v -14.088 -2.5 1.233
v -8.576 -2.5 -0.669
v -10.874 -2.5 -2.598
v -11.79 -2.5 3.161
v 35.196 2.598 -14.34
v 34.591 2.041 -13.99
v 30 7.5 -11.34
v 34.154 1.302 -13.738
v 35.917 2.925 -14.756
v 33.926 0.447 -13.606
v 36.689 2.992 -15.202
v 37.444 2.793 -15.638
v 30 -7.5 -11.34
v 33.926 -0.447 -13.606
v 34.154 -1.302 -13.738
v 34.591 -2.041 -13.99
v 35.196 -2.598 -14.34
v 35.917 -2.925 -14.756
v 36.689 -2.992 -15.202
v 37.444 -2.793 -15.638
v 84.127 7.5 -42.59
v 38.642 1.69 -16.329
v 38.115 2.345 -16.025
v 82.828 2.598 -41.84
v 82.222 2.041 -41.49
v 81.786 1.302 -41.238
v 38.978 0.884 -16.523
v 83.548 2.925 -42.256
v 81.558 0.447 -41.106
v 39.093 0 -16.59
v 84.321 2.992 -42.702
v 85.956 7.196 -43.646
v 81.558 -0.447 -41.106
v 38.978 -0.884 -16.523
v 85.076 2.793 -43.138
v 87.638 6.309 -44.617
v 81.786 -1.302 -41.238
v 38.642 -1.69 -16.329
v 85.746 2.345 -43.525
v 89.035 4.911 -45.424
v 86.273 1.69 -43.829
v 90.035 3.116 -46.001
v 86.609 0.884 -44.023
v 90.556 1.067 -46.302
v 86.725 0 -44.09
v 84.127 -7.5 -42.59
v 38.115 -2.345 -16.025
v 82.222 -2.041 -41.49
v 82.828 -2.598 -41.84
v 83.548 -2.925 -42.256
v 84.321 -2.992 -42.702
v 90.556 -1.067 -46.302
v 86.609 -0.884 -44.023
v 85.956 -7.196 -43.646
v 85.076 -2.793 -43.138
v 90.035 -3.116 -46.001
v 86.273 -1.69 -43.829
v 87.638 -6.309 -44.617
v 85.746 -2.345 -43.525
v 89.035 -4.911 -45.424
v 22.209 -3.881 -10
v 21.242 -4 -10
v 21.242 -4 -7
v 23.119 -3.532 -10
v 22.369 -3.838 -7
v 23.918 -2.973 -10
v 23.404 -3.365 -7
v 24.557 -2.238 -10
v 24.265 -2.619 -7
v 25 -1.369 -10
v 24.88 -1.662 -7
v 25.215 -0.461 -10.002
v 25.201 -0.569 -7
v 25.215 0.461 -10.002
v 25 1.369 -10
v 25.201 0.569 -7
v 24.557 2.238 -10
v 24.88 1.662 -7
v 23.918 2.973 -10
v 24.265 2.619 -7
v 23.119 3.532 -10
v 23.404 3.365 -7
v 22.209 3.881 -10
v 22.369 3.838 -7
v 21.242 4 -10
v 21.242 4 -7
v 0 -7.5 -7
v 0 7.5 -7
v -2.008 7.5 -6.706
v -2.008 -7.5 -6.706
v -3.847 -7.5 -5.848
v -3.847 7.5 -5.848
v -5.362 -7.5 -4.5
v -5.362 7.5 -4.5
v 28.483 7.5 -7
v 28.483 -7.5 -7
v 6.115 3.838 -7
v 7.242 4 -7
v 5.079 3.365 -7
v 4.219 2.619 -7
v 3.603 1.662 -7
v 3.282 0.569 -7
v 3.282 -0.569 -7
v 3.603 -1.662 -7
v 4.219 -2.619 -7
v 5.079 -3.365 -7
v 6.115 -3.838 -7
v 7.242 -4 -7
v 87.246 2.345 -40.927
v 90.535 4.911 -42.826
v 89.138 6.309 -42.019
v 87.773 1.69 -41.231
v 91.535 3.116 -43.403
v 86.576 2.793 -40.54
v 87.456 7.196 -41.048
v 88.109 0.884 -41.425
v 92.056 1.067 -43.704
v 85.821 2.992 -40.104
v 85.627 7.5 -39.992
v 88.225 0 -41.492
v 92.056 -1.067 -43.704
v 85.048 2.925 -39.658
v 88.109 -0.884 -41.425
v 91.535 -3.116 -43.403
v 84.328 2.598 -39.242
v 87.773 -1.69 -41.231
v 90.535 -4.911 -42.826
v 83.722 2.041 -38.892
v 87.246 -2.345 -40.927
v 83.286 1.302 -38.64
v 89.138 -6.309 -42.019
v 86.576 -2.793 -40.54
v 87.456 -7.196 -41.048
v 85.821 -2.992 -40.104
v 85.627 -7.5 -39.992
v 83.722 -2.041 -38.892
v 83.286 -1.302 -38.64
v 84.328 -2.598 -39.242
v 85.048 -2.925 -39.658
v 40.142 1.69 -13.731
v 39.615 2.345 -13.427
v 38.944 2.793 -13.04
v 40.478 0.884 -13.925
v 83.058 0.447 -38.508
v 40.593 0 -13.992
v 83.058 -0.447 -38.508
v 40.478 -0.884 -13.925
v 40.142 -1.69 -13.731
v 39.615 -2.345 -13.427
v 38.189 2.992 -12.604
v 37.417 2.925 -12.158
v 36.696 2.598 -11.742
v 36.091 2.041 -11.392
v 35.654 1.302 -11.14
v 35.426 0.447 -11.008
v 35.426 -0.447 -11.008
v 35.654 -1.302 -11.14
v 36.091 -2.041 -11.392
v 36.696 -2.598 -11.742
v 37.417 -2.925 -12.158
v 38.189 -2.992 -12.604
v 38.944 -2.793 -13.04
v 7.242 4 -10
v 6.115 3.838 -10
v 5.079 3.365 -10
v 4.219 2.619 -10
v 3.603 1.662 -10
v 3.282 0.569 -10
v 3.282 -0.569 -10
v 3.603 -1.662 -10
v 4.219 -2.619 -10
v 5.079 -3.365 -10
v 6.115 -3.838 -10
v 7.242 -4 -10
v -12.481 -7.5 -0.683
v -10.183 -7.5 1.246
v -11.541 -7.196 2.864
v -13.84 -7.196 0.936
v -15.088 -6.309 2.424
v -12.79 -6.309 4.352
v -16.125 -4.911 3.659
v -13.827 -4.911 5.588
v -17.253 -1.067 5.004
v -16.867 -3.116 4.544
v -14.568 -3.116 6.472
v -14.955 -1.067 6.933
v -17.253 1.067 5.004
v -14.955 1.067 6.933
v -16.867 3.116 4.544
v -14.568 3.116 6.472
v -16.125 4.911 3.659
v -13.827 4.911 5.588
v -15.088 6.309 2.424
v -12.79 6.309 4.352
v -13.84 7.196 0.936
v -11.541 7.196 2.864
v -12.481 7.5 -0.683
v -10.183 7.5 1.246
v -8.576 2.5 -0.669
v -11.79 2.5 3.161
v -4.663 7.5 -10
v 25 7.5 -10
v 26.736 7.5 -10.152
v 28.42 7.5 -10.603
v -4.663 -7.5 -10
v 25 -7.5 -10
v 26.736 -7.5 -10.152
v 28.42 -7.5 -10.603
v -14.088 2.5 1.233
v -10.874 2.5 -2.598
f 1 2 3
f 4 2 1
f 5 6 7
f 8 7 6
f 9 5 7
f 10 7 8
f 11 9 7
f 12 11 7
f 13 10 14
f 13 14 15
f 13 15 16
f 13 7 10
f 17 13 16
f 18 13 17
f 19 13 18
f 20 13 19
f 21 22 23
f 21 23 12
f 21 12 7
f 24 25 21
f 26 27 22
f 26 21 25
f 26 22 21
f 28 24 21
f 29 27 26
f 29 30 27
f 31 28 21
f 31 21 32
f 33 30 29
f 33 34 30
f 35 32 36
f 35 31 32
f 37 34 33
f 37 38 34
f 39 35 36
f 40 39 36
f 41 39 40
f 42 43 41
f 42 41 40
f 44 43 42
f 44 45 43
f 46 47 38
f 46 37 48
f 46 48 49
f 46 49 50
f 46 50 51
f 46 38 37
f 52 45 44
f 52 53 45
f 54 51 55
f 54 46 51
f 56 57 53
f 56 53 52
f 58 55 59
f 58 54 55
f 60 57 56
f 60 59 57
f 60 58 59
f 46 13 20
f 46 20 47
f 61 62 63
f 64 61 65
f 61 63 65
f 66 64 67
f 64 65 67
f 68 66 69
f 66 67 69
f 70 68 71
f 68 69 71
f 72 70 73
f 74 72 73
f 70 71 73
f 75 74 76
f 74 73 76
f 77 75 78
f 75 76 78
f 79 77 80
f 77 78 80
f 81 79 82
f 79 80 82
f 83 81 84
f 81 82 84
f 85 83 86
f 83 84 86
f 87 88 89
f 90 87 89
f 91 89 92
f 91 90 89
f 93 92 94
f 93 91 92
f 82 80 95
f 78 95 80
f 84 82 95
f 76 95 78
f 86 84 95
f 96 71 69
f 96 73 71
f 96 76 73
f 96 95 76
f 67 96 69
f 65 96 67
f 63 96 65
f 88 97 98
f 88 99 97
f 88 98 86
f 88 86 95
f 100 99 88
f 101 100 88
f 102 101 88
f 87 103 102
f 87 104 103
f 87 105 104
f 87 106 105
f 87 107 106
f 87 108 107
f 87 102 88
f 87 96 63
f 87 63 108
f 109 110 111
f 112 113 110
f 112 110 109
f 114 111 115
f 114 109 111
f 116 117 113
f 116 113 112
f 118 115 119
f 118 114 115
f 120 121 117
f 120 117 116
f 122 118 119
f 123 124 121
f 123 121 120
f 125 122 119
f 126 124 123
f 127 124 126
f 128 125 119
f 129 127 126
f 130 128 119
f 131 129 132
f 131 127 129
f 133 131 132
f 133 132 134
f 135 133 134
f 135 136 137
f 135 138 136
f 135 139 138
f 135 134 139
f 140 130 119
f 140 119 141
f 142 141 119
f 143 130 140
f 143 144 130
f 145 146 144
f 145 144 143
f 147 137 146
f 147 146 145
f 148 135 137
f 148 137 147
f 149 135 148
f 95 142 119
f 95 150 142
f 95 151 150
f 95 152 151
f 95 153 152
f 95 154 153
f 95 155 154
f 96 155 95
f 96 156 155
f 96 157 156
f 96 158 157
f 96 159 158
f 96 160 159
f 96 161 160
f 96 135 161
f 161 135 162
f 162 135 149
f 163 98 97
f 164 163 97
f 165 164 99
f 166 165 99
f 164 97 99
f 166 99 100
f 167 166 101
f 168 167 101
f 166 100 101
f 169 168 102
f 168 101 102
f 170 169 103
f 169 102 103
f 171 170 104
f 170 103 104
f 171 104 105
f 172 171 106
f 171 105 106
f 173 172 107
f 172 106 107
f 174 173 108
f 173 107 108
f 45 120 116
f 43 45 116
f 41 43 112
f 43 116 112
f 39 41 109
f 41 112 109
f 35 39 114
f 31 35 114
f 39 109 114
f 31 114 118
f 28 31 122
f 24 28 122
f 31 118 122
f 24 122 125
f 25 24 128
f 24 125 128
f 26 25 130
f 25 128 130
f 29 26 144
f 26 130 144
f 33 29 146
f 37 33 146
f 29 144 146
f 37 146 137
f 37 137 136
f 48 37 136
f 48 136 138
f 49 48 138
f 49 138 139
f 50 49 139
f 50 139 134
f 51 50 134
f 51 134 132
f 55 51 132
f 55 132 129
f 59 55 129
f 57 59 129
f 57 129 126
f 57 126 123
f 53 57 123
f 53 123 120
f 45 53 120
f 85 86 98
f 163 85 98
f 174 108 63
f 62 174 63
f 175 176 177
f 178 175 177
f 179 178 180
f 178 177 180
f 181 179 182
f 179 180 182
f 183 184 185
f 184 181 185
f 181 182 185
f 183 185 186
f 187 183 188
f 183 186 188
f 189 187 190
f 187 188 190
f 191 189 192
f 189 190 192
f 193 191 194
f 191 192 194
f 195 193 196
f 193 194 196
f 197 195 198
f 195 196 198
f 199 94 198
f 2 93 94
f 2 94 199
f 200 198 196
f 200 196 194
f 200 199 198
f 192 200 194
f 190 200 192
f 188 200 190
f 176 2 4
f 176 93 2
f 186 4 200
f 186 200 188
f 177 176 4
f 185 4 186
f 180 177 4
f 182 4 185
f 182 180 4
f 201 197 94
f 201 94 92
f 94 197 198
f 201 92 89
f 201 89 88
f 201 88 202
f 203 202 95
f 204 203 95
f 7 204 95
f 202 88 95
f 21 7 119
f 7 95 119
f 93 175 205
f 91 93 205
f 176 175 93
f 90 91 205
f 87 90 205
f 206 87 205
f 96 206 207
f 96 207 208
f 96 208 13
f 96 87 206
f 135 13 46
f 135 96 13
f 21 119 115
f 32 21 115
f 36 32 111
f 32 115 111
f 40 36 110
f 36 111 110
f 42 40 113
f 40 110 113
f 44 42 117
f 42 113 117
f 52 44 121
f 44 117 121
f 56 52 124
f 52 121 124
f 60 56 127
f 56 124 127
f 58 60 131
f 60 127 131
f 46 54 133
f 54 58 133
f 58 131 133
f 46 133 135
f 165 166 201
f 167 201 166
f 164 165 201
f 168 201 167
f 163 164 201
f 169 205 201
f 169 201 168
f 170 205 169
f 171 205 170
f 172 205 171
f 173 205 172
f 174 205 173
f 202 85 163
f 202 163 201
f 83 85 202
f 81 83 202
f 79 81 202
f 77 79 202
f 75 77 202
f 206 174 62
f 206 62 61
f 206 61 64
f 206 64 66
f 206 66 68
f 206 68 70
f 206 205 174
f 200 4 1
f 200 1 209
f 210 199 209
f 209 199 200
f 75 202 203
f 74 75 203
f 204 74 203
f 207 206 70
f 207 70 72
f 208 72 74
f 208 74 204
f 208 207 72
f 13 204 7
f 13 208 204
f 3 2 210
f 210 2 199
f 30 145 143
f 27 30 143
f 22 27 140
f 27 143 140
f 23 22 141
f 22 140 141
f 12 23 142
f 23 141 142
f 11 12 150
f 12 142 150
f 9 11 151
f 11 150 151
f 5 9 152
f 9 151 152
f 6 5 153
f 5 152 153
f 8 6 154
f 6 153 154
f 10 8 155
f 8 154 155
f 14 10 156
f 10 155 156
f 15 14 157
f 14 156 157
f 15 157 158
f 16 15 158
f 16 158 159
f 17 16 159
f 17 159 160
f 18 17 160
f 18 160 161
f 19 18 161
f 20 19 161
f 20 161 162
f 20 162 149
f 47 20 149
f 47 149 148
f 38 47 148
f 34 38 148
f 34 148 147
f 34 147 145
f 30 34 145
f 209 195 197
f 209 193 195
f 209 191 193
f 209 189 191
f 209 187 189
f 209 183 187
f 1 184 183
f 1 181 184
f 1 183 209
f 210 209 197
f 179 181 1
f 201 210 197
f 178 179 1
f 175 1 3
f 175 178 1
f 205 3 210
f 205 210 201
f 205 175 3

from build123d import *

# Parameters (mm, degrees)
F1_DEPTH = 7.5
F2_W     = 5
F2_H     = 5
F3_DEPTH = 36.0419135764
F5_DEPTH = 39.3407459622
F6_R     = 3
F7_DEPTH = 56.9630184207


with BuildPart() as f1:
    # F0 (on Front) → F1 (new body, symmetric)
    with BuildSketch(Plane.XZ):
        with BuildLine():
            Line((-5.3623111018, -4.4995132678), (-15.0041252471, 6.991153379))
            Line((-15.0041252471, 6.991153379), (-17.3022585765, 5.0627905499))
            Line((-17.3022585765, 5.0627905499), (-4.6630765815, -10))
            Line((-4.6630765815, -10), (25, -10))
            ThreePointArc((25, -10), (27.588190451, -10.3407417371), (30, -11.3397459622))
            Line((30, -11.3397459622), (90.6217782649, -46.3397459622))
            Line((90.6217782649, -46.3397459622), (92.1217782649, -43.7416697508))
            Line((92.1217782649, -43.7416697508), (28.4833395016, -7))
            Line((28.4833395016, -7), (0, -7))
            ThreePointArc((0, -7), (-2.9583278322, -6.3441545093), (-5.3623111018, -4.4995132678))
        make_face()
    extrude(amount=F1_DEPTH, both=True)

    # F2 (on face) → F3 (cut, through all)
    with BuildSketch(Plane(origin=(-5.3623111018, 0, -4.4995132678), x_dir=(0, 1, 0), z_dir=(0.7660444431, 0, 0.6427876097))):
        with BuildLine():
            ThreePointArc((-7.5, 7.5), (-5.3033008589, 12.8033008589), (0, 15))
            Line((0, 15), (-7.5, 15))
            Line((-7.5, 15), (-7.5, 7.5))
        make_face()
        with Locations((0, 7.5)):
            Rectangle(F2_W, F2_H)
        with BuildLine():
            ThreePointArc((0, 15), (5.3033008589, 12.8033008589), (7.5, 7.5))
            Line((7.5, 7.5), (7.5, 15))
            Line((7.5, 15), (0, 15))
        make_face()
    extrude(amount=-F3_DEPTH, mode=Mode.SUBTRACT)

    # F4 (on face) → F5 (cut, through all)
    with BuildSketch(Plane.XY.offset(-7)):
        with BuildLine():
            ThreePointArc((7.2416697508, 4), (3.2416697508, 0), (7.2416697508, -4))
            Line((7.2416697508, -4), (21.2416697508, -4))
            ThreePointArc((21.2416697508, -4), (25.2416697508, 0), (21.2416697508, 4))
            Line((21.2416697508, 4), (7.2416697508, 4))
        make_face()
    extrude(amount=-F5_DEPTH, mode=Mode.SUBTRACT)

    # F6 (on face) → F7 (cut, through all)
    with BuildSketch(Plane(origin=(4.0897459622, 0, 7.0836477965), x_dir=(0.8660254038, 0, -0.5), z_dir=(0.5, 0, 0.8660254038))):
        with Locations((39.1506350946, 0)):
            Circle(F6_R)
        with Locations((94.1506350946, 0)):
            Circle(F6_R)
        with BuildLine():
            ThreePointArc((94.1506350946, 7.5), (99.4539359535, 5.3033008589), (101.6506350946, 0))
            Line((101.6506350946, 0), (101.6506350946, 7.5))
            Line((101.6506350946, 7.5), (94.1506350946, 7.5))
        make_face()
        with BuildLine():
            ThreePointArc((101.6506350946, 0), (99.4539359535, -5.3033008589), (94.1506350946, -7.5))
            Line((94.1506350946, -7.5), (101.6506350946, -7.5))
            Line((101.6506350946, -7.5), (101.6506350946, 0))
        make_face()
    extrude(amount=-F7_DEPTH, mode=Mode.SUBTRACT)


solid = f1.part
